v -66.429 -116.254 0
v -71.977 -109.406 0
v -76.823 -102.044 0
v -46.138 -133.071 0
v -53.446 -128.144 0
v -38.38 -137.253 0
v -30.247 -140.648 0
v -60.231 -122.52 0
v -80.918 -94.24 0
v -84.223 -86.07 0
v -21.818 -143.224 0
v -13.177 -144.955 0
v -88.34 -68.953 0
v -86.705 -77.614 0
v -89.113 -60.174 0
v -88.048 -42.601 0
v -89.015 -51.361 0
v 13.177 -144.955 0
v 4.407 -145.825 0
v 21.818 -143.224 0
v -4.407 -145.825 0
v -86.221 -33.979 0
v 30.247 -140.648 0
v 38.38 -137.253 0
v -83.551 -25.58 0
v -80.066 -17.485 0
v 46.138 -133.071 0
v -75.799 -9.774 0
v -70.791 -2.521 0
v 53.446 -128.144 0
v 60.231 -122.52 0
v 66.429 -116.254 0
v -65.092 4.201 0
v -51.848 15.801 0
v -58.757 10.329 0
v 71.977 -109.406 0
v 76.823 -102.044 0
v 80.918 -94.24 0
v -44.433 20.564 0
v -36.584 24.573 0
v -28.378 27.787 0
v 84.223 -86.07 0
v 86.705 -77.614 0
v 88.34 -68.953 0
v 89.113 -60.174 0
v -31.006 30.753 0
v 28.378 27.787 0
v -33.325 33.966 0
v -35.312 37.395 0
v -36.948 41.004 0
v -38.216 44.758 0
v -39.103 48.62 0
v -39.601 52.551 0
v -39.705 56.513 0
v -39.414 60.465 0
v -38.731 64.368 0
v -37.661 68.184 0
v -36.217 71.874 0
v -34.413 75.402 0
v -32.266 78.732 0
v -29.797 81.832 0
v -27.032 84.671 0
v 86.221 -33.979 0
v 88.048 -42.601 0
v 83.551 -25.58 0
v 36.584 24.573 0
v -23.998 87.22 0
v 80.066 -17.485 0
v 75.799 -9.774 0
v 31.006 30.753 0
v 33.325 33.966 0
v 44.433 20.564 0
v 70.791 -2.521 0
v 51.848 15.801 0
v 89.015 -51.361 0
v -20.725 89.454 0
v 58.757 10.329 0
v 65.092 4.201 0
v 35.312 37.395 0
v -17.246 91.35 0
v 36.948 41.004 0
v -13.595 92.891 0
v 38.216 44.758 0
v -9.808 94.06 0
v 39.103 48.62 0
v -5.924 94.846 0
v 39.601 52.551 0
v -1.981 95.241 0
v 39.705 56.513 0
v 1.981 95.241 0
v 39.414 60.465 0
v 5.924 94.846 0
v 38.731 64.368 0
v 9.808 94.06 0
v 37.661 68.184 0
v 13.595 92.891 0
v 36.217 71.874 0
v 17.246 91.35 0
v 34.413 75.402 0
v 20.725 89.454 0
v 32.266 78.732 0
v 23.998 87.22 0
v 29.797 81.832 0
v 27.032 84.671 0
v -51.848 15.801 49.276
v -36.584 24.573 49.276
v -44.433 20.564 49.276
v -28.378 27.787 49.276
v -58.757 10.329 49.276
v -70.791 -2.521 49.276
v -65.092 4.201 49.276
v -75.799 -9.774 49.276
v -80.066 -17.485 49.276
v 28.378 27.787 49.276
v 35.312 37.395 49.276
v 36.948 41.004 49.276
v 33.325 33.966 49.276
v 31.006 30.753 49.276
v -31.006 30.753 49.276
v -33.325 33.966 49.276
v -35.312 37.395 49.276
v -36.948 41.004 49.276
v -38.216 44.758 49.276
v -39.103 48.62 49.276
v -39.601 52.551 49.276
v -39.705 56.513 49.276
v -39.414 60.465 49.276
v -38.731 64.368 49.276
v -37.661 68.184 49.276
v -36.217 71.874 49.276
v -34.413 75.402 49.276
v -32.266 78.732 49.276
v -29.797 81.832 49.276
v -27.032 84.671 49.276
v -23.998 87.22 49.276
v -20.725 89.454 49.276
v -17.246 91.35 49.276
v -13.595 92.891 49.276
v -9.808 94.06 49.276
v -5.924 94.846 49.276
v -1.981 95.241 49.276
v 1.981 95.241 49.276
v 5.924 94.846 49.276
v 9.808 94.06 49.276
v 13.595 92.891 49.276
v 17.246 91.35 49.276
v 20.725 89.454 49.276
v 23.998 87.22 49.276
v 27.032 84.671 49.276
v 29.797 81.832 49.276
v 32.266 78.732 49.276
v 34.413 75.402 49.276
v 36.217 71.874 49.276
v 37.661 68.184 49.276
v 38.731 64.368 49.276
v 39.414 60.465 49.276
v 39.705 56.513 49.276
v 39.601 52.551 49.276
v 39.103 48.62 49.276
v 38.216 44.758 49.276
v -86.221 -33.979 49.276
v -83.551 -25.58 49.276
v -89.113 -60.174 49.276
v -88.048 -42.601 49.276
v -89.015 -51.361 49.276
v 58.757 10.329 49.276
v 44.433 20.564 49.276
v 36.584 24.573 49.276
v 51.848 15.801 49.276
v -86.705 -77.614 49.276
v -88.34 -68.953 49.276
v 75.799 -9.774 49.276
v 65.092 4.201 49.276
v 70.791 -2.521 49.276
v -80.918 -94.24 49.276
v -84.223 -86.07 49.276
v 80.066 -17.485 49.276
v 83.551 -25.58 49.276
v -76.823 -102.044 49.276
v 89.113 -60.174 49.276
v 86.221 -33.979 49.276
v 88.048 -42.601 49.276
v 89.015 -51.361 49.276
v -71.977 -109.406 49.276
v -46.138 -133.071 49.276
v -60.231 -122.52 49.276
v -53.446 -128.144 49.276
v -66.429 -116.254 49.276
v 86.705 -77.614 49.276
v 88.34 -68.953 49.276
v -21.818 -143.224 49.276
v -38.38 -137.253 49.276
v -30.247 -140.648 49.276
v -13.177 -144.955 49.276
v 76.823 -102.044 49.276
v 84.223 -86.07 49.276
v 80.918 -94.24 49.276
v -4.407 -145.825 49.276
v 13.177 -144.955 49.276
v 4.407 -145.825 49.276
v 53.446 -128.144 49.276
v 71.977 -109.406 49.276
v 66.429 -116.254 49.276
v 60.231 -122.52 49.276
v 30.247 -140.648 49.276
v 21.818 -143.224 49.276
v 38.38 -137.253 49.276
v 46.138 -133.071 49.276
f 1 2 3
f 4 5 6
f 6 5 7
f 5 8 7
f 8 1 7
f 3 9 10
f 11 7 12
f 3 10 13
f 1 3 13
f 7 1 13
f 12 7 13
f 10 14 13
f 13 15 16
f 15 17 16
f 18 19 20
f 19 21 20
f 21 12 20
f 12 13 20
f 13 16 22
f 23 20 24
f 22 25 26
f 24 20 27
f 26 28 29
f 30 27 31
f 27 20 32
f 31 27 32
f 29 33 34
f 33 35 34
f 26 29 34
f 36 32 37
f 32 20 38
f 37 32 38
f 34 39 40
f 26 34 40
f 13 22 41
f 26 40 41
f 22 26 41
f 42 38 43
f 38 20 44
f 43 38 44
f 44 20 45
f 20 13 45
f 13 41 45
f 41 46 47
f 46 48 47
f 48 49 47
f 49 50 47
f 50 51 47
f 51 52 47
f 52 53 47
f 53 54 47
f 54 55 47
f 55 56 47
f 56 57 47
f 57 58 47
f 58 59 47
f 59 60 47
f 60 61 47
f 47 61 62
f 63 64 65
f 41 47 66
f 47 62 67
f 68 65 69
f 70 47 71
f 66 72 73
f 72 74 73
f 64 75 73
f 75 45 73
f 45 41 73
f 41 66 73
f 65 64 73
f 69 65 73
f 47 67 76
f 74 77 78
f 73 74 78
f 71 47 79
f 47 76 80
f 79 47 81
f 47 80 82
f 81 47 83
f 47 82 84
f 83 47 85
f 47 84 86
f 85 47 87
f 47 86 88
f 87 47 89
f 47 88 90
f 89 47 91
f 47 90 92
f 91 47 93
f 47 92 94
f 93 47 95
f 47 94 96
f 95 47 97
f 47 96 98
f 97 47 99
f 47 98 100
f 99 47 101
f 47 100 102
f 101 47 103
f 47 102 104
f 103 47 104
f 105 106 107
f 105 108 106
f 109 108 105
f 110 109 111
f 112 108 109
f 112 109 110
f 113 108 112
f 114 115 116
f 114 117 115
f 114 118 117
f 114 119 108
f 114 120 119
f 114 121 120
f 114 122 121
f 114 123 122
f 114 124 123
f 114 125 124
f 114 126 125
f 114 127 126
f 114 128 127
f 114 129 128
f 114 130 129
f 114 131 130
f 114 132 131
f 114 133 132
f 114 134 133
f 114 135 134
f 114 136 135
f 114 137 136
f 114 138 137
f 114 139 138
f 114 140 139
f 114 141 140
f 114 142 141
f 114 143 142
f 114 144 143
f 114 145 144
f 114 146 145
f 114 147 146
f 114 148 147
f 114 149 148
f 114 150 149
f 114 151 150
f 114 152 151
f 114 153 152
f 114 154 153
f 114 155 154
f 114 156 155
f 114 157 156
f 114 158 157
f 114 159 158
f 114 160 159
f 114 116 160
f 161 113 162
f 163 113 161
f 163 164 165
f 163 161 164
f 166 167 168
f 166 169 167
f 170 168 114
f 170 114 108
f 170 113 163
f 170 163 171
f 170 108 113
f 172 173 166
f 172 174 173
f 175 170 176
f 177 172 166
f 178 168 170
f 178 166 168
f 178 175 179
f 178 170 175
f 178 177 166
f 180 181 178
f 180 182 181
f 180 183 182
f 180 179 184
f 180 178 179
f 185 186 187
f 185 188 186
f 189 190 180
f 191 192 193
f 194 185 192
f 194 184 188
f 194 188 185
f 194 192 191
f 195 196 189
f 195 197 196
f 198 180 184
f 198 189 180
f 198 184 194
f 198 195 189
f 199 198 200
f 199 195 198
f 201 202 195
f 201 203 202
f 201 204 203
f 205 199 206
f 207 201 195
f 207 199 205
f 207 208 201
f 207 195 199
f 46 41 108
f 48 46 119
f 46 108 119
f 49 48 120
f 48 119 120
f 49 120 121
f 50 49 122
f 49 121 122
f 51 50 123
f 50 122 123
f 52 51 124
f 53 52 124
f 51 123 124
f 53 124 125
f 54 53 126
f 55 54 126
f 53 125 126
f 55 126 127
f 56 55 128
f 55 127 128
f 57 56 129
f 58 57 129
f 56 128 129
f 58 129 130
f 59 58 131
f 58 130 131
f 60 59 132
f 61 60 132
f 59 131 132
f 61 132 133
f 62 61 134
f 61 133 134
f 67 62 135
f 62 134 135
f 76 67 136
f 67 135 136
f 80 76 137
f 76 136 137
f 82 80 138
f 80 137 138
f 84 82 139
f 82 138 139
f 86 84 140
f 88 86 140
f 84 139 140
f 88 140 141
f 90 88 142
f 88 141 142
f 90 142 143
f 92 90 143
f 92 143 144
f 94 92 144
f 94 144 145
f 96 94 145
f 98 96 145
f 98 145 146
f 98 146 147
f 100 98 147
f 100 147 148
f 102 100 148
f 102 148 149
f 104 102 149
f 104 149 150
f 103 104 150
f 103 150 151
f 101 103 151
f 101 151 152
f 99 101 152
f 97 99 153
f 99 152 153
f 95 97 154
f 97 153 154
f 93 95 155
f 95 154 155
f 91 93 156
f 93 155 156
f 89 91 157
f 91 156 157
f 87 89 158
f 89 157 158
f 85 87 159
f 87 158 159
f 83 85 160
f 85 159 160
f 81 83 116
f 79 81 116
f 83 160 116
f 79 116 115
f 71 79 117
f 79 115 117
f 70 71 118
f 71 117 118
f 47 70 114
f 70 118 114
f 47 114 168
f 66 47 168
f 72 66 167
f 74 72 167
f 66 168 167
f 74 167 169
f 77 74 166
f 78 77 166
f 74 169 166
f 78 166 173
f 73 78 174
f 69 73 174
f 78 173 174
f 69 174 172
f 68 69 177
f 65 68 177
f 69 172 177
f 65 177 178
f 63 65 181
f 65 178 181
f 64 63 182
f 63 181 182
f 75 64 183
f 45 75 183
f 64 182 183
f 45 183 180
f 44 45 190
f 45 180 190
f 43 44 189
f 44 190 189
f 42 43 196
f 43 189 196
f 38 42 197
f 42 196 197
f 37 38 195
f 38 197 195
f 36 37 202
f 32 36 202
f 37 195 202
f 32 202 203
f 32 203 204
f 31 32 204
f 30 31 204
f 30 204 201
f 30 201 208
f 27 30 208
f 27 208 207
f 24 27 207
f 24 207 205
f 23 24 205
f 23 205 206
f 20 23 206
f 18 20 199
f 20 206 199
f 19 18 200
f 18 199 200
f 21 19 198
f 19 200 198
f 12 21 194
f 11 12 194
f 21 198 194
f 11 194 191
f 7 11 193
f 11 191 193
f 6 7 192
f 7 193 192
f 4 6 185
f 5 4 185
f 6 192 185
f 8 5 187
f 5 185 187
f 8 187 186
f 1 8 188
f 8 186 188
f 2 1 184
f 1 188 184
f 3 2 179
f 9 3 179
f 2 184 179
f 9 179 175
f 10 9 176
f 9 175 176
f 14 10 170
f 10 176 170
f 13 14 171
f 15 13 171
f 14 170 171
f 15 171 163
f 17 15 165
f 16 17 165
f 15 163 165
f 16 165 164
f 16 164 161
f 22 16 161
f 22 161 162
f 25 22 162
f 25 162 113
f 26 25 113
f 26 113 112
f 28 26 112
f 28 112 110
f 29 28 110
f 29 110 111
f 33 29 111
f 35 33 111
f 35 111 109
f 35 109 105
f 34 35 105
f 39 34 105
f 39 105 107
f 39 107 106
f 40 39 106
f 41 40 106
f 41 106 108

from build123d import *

# Parameters (mm, degrees)
F1_DEPTH   = 49.276
F1_FACE_W  = 39.7166078589
F1_FACE_H  = 49.276
F1_FACE1_W = 89.1782223892
F1_FACE1_H = 49.276


with BuildPart() as f1:
    # F0 (on Top) → F1 (new body)
    with BuildSketch(Plane.XY):
        Polygon((28.3779297024, 27.7867242694), (0, 55.5734485388), (0, -56.7558594048), align=None)
    extrude(amount=F1_DEPTH)

    # F1_face (on face) → F2 (revolve)
    with BuildSketch(Plane(origin=(14.1889648512, 41.6800864041, 24.638), x_dir=(-0.7145104084, 0.6996248111, 0), z_dir=(0.6996248111, 0.7145104084, 0))):
        Rectangle(F1_FACE_W, F1_FACE_H)
    revolve(axis=Axis((0, 55.5734485388, 24.638), (0, 0, -1)))

    # F1_face1 (on face) → F3 (revolve)
    with BuildSketch(Plane(origin=(14.1889648512, -14.4845675677, 24.638), x_dir=(0.3182159157, 0.9480182651, 0), z_dir=(0.9480182651, -0.3182159157, 0))):
        Rectangle(F1_FACE1_W, F1_FACE1_H)
    revolve(axis=Axis((0, -56.7558594048, 24.638), (0, 0, -1)))


solid = f1.part
